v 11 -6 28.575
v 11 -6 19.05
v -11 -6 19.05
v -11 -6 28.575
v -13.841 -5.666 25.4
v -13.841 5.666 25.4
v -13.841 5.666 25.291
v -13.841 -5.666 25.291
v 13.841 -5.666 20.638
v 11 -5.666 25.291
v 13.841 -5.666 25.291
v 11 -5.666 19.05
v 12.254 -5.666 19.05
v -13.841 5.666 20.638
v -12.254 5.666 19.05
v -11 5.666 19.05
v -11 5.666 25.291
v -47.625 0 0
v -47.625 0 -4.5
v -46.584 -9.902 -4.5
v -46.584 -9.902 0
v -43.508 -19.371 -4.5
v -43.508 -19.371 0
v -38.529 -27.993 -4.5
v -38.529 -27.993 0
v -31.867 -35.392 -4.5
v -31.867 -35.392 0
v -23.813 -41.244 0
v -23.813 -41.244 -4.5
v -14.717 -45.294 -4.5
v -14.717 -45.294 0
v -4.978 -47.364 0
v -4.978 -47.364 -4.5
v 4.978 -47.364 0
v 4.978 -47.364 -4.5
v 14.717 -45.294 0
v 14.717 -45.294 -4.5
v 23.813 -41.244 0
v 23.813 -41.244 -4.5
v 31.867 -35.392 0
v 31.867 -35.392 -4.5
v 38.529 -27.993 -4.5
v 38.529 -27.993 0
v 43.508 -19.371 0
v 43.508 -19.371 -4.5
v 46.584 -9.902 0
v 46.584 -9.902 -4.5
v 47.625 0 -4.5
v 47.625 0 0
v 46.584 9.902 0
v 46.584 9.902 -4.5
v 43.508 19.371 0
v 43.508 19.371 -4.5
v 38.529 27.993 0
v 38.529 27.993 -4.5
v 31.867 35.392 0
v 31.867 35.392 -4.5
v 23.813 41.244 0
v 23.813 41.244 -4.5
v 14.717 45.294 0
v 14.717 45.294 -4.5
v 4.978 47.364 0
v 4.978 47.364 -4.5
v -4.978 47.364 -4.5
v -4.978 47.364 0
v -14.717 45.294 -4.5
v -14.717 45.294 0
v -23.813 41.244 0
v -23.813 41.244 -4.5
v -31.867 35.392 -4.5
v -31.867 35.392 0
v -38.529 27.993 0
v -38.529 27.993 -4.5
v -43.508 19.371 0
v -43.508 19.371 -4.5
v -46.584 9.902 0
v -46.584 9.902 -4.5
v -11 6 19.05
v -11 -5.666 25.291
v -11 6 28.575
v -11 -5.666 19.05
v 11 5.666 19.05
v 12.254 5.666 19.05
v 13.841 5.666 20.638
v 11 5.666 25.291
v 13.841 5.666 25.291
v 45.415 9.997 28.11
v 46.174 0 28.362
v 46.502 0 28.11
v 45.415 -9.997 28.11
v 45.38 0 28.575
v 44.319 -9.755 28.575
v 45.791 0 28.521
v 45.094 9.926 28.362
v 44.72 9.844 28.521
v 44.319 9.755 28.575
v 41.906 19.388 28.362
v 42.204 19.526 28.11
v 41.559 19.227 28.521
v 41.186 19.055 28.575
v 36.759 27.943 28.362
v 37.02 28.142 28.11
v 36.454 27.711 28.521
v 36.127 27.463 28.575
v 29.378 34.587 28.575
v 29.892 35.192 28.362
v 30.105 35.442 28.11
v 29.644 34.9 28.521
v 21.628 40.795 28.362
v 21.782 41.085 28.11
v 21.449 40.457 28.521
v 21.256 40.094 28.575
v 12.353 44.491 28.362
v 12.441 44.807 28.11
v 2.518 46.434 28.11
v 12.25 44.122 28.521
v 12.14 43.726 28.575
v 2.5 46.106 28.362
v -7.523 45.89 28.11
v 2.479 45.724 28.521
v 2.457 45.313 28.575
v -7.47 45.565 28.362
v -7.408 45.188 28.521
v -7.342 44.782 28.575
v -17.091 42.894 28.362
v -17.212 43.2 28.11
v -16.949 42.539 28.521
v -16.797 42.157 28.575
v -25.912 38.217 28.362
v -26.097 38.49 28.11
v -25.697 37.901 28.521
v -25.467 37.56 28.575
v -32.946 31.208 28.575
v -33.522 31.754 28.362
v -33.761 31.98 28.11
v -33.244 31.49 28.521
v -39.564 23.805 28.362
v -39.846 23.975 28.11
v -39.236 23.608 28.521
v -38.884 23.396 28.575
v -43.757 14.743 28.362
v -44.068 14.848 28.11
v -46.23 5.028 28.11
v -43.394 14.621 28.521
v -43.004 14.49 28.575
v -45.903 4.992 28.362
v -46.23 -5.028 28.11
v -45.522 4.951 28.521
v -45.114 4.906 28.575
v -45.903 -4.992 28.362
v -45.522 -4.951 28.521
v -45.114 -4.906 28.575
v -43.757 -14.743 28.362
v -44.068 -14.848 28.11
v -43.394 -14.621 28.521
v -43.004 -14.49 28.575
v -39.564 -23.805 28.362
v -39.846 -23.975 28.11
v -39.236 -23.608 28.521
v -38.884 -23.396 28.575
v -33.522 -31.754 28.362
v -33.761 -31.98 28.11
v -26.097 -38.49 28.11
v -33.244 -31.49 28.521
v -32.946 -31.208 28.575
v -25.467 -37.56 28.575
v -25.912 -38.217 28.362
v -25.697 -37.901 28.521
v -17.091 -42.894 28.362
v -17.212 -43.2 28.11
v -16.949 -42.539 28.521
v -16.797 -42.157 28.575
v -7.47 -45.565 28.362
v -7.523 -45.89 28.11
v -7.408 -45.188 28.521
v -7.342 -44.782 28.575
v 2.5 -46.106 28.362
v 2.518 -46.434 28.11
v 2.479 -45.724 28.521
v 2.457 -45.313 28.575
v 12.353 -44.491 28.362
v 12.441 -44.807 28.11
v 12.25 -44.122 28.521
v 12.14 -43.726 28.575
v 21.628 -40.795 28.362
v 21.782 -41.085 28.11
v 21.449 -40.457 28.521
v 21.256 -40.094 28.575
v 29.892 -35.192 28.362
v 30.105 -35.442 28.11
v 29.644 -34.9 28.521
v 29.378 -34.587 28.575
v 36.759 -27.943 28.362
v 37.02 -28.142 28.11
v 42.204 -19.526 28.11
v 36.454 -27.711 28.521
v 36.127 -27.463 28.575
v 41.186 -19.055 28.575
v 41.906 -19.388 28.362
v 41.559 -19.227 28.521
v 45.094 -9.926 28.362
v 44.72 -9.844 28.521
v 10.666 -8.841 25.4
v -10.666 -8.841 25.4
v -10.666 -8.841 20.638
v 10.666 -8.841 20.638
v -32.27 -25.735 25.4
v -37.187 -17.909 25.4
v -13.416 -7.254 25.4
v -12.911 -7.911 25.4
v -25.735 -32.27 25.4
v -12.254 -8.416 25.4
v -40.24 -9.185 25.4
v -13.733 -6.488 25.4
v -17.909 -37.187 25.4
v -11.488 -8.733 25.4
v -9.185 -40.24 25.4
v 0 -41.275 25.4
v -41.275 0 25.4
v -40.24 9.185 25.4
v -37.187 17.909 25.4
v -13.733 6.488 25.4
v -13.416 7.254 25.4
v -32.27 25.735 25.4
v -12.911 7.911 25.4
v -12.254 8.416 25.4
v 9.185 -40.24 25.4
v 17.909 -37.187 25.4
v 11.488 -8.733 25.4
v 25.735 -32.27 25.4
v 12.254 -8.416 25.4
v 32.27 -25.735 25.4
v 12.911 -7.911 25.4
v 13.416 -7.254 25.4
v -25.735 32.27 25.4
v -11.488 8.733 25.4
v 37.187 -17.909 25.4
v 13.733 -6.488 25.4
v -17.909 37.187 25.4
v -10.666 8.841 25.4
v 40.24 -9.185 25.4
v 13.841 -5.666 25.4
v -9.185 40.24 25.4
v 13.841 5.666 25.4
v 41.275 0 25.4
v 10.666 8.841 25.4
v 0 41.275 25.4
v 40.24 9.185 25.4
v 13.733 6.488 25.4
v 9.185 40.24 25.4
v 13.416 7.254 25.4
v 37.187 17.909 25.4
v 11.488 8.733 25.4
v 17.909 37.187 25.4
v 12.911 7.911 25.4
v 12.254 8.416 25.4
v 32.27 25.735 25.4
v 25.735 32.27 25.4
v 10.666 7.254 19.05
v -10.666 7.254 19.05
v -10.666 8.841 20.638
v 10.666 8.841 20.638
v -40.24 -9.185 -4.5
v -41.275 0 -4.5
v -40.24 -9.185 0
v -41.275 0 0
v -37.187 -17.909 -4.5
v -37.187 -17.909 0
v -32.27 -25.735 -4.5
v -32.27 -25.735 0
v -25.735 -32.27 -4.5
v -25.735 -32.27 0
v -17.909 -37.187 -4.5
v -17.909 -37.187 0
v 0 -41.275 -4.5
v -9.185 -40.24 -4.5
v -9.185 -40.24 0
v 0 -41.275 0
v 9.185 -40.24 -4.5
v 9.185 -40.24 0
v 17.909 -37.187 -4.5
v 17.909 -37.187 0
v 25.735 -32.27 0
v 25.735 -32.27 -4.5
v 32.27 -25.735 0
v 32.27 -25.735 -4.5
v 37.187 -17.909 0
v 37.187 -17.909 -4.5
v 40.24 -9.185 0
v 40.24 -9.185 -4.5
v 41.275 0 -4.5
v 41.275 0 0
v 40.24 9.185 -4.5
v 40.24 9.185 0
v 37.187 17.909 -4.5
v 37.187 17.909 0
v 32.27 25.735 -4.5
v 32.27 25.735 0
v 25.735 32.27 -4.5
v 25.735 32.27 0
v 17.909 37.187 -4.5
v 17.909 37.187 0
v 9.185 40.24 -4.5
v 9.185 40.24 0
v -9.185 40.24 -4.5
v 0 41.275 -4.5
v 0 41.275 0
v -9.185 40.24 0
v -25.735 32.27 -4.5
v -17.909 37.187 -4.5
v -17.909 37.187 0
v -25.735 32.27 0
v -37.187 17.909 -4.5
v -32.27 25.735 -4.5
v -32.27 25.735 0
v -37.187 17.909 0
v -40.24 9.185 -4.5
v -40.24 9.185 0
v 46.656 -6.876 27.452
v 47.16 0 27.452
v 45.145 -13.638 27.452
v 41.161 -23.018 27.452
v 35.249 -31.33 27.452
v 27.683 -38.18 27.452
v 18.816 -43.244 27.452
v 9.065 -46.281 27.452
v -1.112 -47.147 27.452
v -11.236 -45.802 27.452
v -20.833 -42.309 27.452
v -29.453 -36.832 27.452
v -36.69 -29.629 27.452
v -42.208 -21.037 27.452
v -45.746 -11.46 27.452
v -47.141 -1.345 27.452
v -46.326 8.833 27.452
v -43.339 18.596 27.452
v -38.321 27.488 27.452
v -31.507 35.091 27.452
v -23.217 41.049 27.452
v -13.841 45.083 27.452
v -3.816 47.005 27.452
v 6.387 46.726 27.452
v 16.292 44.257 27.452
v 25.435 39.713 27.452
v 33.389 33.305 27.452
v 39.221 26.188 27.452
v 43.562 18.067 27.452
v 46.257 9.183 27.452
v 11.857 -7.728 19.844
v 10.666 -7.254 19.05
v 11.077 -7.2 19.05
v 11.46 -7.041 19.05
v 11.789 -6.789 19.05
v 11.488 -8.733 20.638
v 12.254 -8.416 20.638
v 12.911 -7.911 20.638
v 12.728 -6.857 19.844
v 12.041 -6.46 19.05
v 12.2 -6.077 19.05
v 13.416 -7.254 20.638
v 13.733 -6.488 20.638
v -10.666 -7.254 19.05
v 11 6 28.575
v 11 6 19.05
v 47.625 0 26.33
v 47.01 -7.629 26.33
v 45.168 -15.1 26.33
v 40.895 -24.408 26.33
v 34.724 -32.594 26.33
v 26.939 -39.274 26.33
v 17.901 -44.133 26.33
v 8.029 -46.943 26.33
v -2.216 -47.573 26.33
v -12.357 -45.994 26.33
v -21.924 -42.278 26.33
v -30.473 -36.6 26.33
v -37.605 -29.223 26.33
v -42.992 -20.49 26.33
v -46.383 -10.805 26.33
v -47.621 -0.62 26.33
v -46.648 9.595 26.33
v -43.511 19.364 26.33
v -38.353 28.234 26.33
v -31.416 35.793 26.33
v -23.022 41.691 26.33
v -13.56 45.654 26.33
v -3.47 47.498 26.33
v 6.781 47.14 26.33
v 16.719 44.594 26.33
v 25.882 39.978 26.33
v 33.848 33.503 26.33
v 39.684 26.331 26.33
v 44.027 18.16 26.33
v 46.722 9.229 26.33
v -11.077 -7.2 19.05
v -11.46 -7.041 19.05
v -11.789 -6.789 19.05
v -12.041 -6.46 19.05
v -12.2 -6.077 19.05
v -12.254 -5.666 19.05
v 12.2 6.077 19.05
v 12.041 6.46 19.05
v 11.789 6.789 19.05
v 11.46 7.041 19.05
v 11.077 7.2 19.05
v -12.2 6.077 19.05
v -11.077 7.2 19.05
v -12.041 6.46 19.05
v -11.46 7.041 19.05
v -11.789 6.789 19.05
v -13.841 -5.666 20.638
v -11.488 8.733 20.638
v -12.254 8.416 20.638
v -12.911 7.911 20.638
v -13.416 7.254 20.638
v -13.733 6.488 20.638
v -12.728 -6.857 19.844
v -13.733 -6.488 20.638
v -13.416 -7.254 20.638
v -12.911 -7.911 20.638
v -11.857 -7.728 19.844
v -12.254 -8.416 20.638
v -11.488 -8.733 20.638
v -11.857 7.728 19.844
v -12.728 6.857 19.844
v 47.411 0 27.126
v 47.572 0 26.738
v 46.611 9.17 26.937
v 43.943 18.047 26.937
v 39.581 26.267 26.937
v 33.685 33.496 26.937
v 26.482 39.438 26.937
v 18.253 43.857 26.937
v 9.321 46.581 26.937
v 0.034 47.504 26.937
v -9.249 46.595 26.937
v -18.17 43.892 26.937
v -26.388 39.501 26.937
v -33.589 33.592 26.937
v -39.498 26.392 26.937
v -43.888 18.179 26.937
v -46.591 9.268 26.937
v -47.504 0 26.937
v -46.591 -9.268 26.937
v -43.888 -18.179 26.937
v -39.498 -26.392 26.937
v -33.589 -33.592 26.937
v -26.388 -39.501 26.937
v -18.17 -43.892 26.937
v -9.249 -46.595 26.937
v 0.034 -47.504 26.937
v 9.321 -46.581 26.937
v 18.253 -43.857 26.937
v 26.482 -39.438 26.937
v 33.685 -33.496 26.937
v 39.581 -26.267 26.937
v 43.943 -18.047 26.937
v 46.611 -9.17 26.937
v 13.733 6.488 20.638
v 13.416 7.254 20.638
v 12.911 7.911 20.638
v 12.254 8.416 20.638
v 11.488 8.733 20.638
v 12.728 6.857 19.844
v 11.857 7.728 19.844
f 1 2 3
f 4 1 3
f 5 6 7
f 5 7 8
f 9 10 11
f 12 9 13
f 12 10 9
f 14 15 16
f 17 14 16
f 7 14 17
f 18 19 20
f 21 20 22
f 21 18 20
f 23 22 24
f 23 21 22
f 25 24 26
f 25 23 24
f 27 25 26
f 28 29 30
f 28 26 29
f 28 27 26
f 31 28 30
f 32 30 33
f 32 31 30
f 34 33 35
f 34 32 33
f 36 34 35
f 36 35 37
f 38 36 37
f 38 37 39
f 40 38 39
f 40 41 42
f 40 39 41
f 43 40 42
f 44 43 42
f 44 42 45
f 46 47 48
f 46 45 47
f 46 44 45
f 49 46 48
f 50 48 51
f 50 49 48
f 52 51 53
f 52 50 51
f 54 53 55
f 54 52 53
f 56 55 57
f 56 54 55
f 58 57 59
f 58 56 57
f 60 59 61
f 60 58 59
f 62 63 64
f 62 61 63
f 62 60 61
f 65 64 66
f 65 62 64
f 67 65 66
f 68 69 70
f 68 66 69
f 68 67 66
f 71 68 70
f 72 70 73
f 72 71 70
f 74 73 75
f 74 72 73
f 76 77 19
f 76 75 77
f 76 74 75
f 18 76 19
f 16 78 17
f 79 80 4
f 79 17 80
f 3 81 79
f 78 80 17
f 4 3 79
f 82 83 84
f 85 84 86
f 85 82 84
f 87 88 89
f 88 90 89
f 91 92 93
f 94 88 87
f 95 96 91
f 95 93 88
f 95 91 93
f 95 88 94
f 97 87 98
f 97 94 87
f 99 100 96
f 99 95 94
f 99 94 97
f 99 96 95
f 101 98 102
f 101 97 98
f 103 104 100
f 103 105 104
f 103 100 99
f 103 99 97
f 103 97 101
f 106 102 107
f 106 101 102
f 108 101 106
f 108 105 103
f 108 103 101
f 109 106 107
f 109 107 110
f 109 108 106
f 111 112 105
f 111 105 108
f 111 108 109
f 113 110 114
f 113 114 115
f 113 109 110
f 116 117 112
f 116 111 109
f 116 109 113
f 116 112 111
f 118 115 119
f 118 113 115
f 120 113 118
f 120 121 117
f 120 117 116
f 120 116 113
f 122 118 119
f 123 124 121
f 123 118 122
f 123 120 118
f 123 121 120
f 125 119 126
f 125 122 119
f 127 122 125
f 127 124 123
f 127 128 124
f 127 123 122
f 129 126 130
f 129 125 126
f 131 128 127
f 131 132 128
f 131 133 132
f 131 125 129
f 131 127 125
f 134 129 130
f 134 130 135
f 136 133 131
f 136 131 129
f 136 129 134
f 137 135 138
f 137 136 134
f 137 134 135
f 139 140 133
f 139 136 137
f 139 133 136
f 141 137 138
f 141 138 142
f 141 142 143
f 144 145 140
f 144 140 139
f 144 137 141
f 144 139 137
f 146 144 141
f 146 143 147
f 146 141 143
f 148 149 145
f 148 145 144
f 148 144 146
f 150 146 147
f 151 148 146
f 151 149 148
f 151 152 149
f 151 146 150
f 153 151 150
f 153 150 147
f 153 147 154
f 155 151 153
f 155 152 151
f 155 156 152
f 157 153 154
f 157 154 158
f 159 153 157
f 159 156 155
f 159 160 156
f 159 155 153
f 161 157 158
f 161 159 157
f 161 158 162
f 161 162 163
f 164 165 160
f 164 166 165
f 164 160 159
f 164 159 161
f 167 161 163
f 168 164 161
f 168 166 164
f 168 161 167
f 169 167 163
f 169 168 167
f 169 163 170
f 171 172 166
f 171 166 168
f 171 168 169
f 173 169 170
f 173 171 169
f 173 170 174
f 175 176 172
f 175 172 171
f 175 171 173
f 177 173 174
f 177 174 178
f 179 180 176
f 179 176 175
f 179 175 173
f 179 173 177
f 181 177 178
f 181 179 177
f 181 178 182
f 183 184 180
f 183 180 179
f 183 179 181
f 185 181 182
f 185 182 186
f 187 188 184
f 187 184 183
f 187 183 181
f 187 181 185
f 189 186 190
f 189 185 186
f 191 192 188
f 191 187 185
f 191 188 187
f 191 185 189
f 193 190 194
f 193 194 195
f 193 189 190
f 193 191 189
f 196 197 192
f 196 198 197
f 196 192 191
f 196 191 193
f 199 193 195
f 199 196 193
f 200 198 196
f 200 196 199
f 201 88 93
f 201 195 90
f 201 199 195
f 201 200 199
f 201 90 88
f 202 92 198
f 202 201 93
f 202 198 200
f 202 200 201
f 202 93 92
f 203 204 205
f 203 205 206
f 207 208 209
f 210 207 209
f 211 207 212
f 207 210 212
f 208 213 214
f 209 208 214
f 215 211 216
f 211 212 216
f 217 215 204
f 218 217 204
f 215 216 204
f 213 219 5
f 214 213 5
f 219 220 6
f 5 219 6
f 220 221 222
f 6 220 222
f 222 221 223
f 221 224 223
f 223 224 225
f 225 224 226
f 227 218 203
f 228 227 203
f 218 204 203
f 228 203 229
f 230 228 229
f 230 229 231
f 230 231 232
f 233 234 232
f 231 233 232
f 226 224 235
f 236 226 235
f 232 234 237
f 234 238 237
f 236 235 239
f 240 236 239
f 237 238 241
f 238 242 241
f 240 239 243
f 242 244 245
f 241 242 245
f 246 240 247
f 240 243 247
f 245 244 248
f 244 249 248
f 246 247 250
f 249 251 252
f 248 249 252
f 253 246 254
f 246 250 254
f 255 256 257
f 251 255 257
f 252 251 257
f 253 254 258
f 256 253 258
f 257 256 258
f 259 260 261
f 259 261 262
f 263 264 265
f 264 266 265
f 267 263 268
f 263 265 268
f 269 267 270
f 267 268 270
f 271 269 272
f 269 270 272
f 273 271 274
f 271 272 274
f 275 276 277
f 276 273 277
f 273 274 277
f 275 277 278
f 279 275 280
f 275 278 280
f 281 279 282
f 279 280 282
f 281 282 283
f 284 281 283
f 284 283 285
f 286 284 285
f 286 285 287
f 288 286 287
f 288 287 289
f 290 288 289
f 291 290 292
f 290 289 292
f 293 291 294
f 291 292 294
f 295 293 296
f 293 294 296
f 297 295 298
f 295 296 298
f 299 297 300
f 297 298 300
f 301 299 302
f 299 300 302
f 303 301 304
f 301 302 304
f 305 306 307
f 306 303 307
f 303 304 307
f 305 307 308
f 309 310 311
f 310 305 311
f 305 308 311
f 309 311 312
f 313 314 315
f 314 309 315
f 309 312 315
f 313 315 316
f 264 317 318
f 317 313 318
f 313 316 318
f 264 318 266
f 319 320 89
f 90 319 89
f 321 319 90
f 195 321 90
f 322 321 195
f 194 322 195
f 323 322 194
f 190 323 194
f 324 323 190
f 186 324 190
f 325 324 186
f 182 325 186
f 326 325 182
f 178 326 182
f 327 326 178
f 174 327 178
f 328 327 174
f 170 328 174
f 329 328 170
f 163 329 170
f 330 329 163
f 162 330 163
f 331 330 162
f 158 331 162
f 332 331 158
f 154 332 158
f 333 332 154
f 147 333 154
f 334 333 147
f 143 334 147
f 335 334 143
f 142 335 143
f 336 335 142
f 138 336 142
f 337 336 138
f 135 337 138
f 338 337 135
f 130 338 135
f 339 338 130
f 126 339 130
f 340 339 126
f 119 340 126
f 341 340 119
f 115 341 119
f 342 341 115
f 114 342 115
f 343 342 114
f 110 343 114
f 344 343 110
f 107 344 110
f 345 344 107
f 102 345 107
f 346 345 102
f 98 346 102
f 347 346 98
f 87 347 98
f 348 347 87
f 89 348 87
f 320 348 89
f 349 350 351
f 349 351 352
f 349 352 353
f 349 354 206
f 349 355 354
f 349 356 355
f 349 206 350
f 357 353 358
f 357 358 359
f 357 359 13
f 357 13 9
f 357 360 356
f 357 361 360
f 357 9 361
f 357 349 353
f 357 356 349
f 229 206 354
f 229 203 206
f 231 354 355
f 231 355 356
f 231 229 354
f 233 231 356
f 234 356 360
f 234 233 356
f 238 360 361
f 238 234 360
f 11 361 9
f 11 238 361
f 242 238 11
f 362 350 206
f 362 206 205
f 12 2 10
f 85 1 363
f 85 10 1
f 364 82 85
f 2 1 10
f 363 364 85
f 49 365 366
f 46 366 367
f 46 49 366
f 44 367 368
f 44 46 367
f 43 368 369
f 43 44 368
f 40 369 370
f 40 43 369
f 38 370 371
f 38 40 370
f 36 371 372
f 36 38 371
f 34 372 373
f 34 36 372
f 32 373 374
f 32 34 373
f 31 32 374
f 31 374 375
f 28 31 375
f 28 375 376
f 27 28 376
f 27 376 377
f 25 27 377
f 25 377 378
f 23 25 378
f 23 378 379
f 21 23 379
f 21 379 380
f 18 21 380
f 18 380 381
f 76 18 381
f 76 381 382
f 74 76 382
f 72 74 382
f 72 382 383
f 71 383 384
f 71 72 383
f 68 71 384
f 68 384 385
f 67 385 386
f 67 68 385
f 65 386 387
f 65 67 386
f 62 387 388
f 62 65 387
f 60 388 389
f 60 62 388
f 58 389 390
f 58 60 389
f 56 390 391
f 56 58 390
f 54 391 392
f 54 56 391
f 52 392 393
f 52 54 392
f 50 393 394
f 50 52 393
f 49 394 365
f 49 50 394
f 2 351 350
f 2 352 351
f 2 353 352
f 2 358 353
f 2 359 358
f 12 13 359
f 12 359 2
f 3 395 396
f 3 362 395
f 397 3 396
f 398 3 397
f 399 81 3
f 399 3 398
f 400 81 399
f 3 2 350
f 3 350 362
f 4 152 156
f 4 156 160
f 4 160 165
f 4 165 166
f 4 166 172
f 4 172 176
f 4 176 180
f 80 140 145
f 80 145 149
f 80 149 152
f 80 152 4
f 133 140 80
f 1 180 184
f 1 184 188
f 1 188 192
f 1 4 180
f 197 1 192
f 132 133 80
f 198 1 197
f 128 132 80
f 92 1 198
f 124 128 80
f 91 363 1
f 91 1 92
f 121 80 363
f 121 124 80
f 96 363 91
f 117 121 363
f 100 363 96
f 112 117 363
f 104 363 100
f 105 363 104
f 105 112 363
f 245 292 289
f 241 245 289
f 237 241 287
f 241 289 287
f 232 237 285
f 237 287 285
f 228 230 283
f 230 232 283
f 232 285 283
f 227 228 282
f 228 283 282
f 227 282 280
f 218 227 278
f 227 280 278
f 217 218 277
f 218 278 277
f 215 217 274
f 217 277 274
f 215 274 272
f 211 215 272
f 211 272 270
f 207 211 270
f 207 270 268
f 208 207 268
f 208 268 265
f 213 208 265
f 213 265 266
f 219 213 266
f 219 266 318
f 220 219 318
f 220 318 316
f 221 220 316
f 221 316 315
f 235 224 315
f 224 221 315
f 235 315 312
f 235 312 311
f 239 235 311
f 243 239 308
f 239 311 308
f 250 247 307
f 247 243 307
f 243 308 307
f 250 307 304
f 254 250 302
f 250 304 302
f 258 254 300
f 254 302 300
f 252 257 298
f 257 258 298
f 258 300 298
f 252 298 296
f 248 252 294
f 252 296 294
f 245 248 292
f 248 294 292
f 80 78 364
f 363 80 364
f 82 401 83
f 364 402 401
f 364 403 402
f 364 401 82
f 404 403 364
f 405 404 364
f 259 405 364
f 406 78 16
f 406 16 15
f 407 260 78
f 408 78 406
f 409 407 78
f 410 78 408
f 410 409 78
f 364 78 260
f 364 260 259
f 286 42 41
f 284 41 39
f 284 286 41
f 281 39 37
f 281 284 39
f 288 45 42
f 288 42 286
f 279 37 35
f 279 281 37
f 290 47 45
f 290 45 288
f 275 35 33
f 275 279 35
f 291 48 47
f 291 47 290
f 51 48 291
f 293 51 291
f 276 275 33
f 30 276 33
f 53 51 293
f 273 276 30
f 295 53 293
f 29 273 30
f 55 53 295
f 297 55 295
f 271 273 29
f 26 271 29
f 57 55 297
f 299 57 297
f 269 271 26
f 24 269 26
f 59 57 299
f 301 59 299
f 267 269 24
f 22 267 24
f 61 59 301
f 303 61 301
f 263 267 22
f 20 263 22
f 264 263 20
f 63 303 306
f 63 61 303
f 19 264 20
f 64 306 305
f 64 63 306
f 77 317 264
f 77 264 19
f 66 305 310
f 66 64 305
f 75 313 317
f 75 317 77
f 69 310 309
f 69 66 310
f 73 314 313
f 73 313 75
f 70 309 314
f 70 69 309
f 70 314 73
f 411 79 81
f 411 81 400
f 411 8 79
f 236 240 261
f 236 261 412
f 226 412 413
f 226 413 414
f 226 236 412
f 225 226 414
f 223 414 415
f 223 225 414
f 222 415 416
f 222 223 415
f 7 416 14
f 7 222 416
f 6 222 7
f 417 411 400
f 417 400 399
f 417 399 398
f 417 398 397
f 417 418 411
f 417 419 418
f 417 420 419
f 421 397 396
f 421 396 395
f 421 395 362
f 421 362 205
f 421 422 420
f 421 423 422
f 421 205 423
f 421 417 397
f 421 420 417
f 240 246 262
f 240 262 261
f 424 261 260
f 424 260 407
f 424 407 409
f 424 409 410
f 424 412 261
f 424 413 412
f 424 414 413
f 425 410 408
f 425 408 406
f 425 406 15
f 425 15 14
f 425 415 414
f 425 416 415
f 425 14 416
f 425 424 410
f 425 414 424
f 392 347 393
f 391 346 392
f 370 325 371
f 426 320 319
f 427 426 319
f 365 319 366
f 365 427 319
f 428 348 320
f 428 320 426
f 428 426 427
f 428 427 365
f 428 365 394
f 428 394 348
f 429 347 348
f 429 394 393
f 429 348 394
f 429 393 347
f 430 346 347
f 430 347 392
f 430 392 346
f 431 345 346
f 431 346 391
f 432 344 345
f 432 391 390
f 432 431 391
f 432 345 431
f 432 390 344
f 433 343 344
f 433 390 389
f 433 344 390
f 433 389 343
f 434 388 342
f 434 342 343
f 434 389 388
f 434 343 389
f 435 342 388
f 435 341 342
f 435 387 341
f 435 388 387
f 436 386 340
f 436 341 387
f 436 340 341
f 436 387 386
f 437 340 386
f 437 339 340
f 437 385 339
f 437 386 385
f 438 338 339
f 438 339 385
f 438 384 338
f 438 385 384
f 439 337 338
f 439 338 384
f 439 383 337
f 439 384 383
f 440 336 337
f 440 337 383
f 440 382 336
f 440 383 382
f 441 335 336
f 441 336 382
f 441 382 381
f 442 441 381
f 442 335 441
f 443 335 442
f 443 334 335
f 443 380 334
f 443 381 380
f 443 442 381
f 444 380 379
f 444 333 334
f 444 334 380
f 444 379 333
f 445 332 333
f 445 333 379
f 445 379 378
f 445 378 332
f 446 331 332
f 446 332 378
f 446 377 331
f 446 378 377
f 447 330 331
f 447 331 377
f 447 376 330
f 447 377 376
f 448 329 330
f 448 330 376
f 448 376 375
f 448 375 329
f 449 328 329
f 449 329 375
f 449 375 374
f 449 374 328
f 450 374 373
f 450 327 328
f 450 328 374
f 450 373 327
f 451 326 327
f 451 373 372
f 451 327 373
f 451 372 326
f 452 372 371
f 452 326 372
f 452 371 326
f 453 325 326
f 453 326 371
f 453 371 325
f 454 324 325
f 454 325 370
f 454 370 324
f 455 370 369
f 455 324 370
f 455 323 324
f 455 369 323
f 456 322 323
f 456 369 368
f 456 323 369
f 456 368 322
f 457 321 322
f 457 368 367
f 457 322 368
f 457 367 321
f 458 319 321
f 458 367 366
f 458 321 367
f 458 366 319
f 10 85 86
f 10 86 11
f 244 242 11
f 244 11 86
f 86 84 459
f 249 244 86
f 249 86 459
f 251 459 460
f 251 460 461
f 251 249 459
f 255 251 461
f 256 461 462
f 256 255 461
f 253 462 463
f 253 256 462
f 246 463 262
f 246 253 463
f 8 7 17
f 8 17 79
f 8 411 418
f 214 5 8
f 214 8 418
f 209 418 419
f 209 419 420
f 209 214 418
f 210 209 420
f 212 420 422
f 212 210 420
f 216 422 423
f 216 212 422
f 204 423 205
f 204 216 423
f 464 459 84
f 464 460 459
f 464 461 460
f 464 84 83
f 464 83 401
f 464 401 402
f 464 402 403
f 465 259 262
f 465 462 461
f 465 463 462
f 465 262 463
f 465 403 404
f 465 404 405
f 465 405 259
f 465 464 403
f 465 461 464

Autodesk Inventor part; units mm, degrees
ref_plane "YZ Plane" through (0, 0, 0) normal (1, 0, 0) x (0, 1, 0)
ref_plane "XZ Plane" through (0, 0, 0) normal (0, 1, 0) x (-1, 0, 0)
ref_plane "XY Plane" through (0, 0, 0) normal (0, 0, 1) x (1, 0, 0)
sketch "Sketch1" plane through (0, 0, 0) normal (0, 0, 1) x (1, 0, 0)
  circle A0 centre (0, 0) radius 41.275
  circle A1 centre (0, 0) radius 47.625
  dimension "d0" = 82.55
  dimension "d1" = 6.35
extrude "Extrusion1" add sketch "Sketch1" along normal blind 25.4
sketch "Sketch2" plane through (0, 0, 25.4) normal (0, 0, 1) x (1, 0, 0)
  circle A0 centre (0, 0) radius 47.625
extrude "Extrusion2" add sketch "Sketch2" along normal blind 3.175
sketch "Sketch3" plane through (0, 0, 25.4) normal (0, 0, -1) x (-1, 0, 0)
  line L0 (11, 6) -> (-11, 6)
  line L1 (-11, 6) -> (-11, -6)
  line L2 (-11, -6) -> (11, -6)
  line L3 (11, -6) -> (11, 6)
  line L4 (11, 6) -> (-11, -6) construction
  line L5 (-11, 6) -> (11, -6) construction
  line L6 (-10.6662, 8.8412) -> (10.6662, 8.8412)
  line L7 (13.8412, 5.6662) -> (13.8412, -5.6662)
  line L8 (10.6662, -8.8412) -> (-10.6662, -8.8412)
  line L9 (-13.8412, -5.6662) -> (-13.8412, 5.6662)
  arc A0 (-10.6662, 8.8412) -> (-13.8412, 5.6662) centre (-10.6662, 5.6662) ccw
  arc A1 (-13.8412, -5.6662) -> (-10.6662, -8.8412) centre (-10.6662, -5.6662) ccw
  arc A2 (10.6662, -8.8412) -> (13.8412, -5.6662) centre (10.6662, -5.6662) ccw
  arc A3 (13.8412, 5.6662) -> (10.6662, 8.8412) centre (10.6662, 5.6662) ccw
  point P0 (0, 0)
  dimension "d6" = 22
  dimension "d7" = 12
  dimension "d8" = 3.175
extrude "Extrusion3" add sketch "Sketch3" along normal blind 6.35
chamfer "Chamfer1" distance 1.5875 angle 45 8 edges at (0, 8.8412, 19.05) (12.9113, 7.9113, 19.05) (13.8412, 0, 19.05) (12.9113, -7.9113, 19.05) (0, -8.8412, 19.05) (-12.9113, -7.9113, 19.05) (-13.8412, 0, 19.05) (-12.9113, 7.9113, 19.05)
sketch "Sketch5" plane through (-13.8412, -5.6662, 25.4) normal (-1, 0, 0) x (0, 0, 1)
  line L0 (-0.1094, 0) -> (-8.0486, 0)
  line L1 (-8.0486, 0) -> (-8.0486, 11.3324)
  line L2 (-8.0486, 11.3324) -> (-0.1094, 11.3324)
  line L3 (-0.1094, 11.3324) -> (-0.1094, 0)
  point P0 (-25.4, 5.6662)
extrude "Extrusion5" cut sketch "Sketch5" against normal blind 28.575
sketch "Sketch6" plane through (0, 0, 0) normal (0, 0, -1) x (-1, 0, 0)
  circle A0 centre (0, 0) radius 47.625 projected
  circle A1 centre (0, 0) radius 41.275 projected
extrude "Extrusion6" add sketch "Sketch6" along normal blind 4.5
chamfer "Chamfer2" distance 1.5875 angle 45 1 edges at (-47.625, 0, 28.575)
fillet "Fillet2" radius 1.5875 1 edges at (-46.0375, 0, 28.575)
fillet "Fillet3" radius 1.5875 1 edges at (-47.625, 0, 26.9875)
sketch "Sketch7" plane through (0, 0, 25.4) normal (0, 0, -1) x (-1, 0, 0)
  circle A0 centre (0, 0) radius 41.275 projected
  line L0 (-10.6662, 8.8412) -> (10.6662, 8.8412) projected
  arc A1 (13.8412, 5.6662) -> (10.6662, 8.8412) centre (10.6662, 5.6662) ccw projected
  line L1 (13.8412, 5.6662) -> (13.8412, -5.6662) projected
  arc A2 (10.6662, -8.8412) -> (13.8412, -5.6662) centre (10.6662, -5.6662) ccw projected
  line L2 (10.6662, -8.8412) -> (-10.6662, -8.8412) projected
  arc A3 (-13.8412, -5.6662) -> (-10.6662, -8.8412) centre (-10.6662, -5.6662) ccw projected
  line L3 (-13.8412, -5.6662) -> (-13.8412, 5.6662) projected
  arc A4 (-10.6662, 8.8412) -> (-13.8412, 5.6662) centre (-10.6662, 5.6662) ccw projected
  line L4 (10.6662, 7.2537) -> (10.6662, 8.8412) projected
  arc A5 (12.2537, 5.6662) -> (10.6662, 7.2537) centre (10.6662, 5.6662) ccw projected
  line L5 (13.8412, 5.6662) -> (12.2537, 5.6662) projected
  arc A6 (13.8412, 5.6662) -> (10.6662, 8.8412) centre (10.6662, 5.6662) ccw projected
  line L6 (-10.6662, 7.2537) -> (10.6662, 7.2537) projected
  line L7 (-12.2537, 5.6662) -> (-11, 5.6662) projected
  line L8 (-11, 5.6662) -> (-11, 6) projected
  line L9 (-11, 6) -> (11, 6) projected
  line L10 (11, 6) -> (11, 5.6662) projected
  line L11 (11, 5.6662) -> (12.2537, 5.6662) projected
  arc A7 (12.2537, 5.6662) -> (10.6662, 7.2537) centre (10.6662, 5.6662) ccw projected
  line L12 (-10.6662, 7.2537) -> (10.6662, 7.2537) projected
  arc A8 (-10.6662, 7.2537) -> (-12.2537, 5.6662) centre (-10.6662, 5.6662) ccw projected
  line L13 (-10.6662, 8.8412) -> (-10.6662, 7.2537) projected
  line L14 (-10.6662, 7.2537) -> (10.6662, 7.2537) projected
  line L15 (10.6662, 7.2537) -> (10.6662, 8.8412) projected
  line L16 (10.6662, 8.8412) -> (-10.6662, 8.8412) projected
  line L17 (-11, 6) -> (11, 6) projected
  line L18 (10.6662, 8.8412) -> (-10.6662, 8.8412) projected
  line L19 (11, 5.6662) -> (12.2537, 5.6662) projected
  line L20 (10.6662, 8.8412) -> (-10.6662, 8.8412)
  line L21 (-10.6662, -8.8412) -> (10.6662, -8.8412) projected
  line L22 (10.6662, -8.8412) -> (-10.6662, -8.8412)
  arc A9 (13.8412, 5.6662) -> (10.6662, 8.8412) centre (10.6662, 5.6662) ccw projected
  arc A10 (13.8412, 5.6662) -> (10.6662, 8.8412) centre (10.6662, 5.6662) ccw
  line L23 (10.6662, -8.8412) -> (10.6662, -7.2537) projected
  arc A11 (10.6662, -8.8412) -> (13.8412, -5.6662) centre (10.6662, -5.6662) ccw
  arc A12 (-13.8412, -5.6662) -> (-10.6662, -8.8412) centre (-10.6662, -5.6662) ccw
  arc A13 (-10.6662, 8.8412) -> (-13.8412, 5.6662) centre (-10.6662, 5.6662) ccw projected
  arc A14 (-10.6662, 8.8412) -> (-13.8412, 5.6662) centre (-10.6662, 5.6662) ccw
  line L24 (11, -6) -> (11, 6) projected
  line L25 (11, 5.6662) -> (11, 6)
  line L26 (11, 6) -> (-11, 6)
  line L27 (-11, 5.6662) -> (-11, -5.6662) projected
  line L28 (-11, 6) -> (-11, 5.6662)
  line L29 (-11, 5.6662) -> (-13.8412, 5.6662)
  line L30 (-11, -5.6662) -> (-13.8412, -5.6662) projected
  line L31 (-13.8412, -5.6662) -> (-11, -5.6662)
  line L32 (-11, -6) -> (-11, -5.6662) projected
  line L33 (-11, -5.6662) -> (-11, -6)
  line L34 (-11, -6) -> (11, -6)
  line L35 (11, -5.6662) -> (11, -6) projected
  line L36 (11, -6) -> (11, -5.6662)
  line L37 (13.8412, -5.6662) -> (11, -5.6662) projected
  line L38 (11, -5.6662) -> (13.8412, -5.6662)
  line L39 (10.6662, 7.2537) -> (10.6662, 8.8412) projected
  arc A15 (13.8412, 5.6662) -> (10.6662, 8.8412) centre (10.6662, 5.6662) ccw
  arc A16 (-10.6662, 8.8412) -> (-13.8412, 5.6662) centre (-10.6662, 5.6662) ccw
  line L40 (10.6662, 8.8412) -> (-10.6662, 8.8412)
  line L41 (11, 6) -> (-11, 6)
  line L42 (-11, 5.6662) -> (-11, 6)
  line L43 (-13.8412, 5.6662) -> (-12.2537, 5.6662) projected
  line L44 (-11, 5.6662) -> (-13.8412, 5.6662)
  line L45 (13.8412, 5.6662) -> (13.8412, -5.6662) projected
  line L46 (13.8412, 5.6662) -> (11, 5.6662)
sketch "Sketch8" plane through (0, 0, 28.575) normal (0, 0, 1) x (1, 0, 0)
  line L0 (0, 0) -> (18.6341, 0)
  line L1 (18.6341, 0) -> (18.6341, -16.7894)
  line L2 (18.6341, -16.7894) -> (18.6341, 0)
  line L3 (18.6341, 0) -> (18.6341, 16.7894)
  line L4 (18.6341, 16.7894) -> (24.9841, 16.7894)
  line L5 (24.9841, 16.7894) -> (24.9841, -16.7894)
  line L6 (24.9841, -16.7894) -> (18.6341, -16.7894)
  dimension "d28" = 16.7894
  dimension "d29" = 6.35
  dimension "d30" = 33.5788
extrude "Extrusion7" add sketch "Sketch8" along normal blind 63.5
fillet "Fillet4" radius 3.175 3 edges at (24.9841, 0, 92.075) (21.8091, -16.7894, 92.075) (21.8091, 16.7894, 92.075)
sketch "Sketch10" plane through (0, 0, 25.4) normal (0, 0, -1) x (-1, 0, 0)
  line L0 (11, 6) -> (-11, 6) projected
  line L1 (-11, -6) -> (11, -6) projected
  line L2 (-11, 6) -> (11, 6)
  line L3 (11, 6) -> (11, -6)
  line L4 (11, -6) -> (-11, -6)
  line L5 (-11, -6) -> (-11, 6)
  point P0 (0, 0)
extrude "Extrusion9" cut sketch "Sketch10" against normal up to surface (3.175 mm away)
sketch "Sketch11" plane through (18.6341, -16.7894, 28.575) normal (-1, 0, 0) x (0, 0, 1)
  line L0 (48.8213, 27.8052) -> (49.1551, 27.8061) projected
  line L1 (37.2166, 5.7727) -> (37.1859, 16.7726) projected
  line L2 (49.1551, 27.8061) -> (37.2166, 27.8061)
  line L3 (37.2166, 27.8061) -> (37.2166, 5.7727)
  line L4 (37.2166, 5.7727) -> (49.1551, 5.7727)
  line L5 (49.1551, 5.7727) -> (49.1551, 27.8061)
  point P0 (-28.575, 16.7894)
extrude "Extrusion10" cut sketch "Sketch11" against normal up to surface (6.35 mm away)
sketch "Sketch12" plane through (18.6341, -16.7894, 28.575) normal (-1, 0, 0) x (0, 0, 1)
  line L0 (37.2166, 5.7727) -> (37.2166, 27.8061) projected
  line L1 (37.2166, 27.8061) -> (49.1551, 27.8061) projected
  line L2 (49.1551, 27.8061) -> (49.1551, 5.7727) projected
  line L3 (49.1551, 5.7727) -> (37.2166, 5.7727) projected
  arc A0 (63.5, 30.4038) -> (60.325, 33.5788) centre (60.325, 30.4038) ccw projected
  line L4 (0, 33.5788) -> (60.325, 33.5788) projected
  line L5 (0, 0) -> (0, 33.5788) projected
  line L6 (0, 0) -> (60.325, 0) projected
  arc A1 (60.325, 0) -> (63.5, 3.175) centre (60.325, 3.175) ccw projected
  line L7 (63.5, 30.4038) -> (63.5, 3.175) projected
  line L8 (37.2166, 27.8061) -> (37.2166, 5.7727) projected
  line L9 (49.1551, 27.8061) -> (37.2166, 27.8061)
  line L10 (37.2166, 27.8061) -> (37.2166, 5.7727)
  line L11 (37.2166, 5.7727) -> (49.1551, 5.7727)
  line L12 (49.1551, 5.7727) -> (49.1551, 27.8061)
  point P0 (-28.575, 16.7894)
sketch "Sketch13" plane through (0, 0, 92.075) normal (0, 0, 1) x (1, 0, 0)
  circle A0 centre (0, 0) radius 41.275 projected
  line L0 (34.9461, 21.9635) -> (13.1232, 21.9635)
  line L1 (13.1232, 21.9635) -> (13.1232, -23.4108)
  line L2 (13.1232, -23.4108) -> (34.9461, -23.4108)
  line L3 (34.9461, -23.4108) -> (34.9461, 21.9635)
  point P0 (33.9936, -23.4108)
  point P1 (34.9461, -21.9635)
extrude "Extrusion11" cut sketch "Sketch13" against normal up to surface (63.5 mm away) contours L3 A0 L2 L1 L0
properties part number "Base"
